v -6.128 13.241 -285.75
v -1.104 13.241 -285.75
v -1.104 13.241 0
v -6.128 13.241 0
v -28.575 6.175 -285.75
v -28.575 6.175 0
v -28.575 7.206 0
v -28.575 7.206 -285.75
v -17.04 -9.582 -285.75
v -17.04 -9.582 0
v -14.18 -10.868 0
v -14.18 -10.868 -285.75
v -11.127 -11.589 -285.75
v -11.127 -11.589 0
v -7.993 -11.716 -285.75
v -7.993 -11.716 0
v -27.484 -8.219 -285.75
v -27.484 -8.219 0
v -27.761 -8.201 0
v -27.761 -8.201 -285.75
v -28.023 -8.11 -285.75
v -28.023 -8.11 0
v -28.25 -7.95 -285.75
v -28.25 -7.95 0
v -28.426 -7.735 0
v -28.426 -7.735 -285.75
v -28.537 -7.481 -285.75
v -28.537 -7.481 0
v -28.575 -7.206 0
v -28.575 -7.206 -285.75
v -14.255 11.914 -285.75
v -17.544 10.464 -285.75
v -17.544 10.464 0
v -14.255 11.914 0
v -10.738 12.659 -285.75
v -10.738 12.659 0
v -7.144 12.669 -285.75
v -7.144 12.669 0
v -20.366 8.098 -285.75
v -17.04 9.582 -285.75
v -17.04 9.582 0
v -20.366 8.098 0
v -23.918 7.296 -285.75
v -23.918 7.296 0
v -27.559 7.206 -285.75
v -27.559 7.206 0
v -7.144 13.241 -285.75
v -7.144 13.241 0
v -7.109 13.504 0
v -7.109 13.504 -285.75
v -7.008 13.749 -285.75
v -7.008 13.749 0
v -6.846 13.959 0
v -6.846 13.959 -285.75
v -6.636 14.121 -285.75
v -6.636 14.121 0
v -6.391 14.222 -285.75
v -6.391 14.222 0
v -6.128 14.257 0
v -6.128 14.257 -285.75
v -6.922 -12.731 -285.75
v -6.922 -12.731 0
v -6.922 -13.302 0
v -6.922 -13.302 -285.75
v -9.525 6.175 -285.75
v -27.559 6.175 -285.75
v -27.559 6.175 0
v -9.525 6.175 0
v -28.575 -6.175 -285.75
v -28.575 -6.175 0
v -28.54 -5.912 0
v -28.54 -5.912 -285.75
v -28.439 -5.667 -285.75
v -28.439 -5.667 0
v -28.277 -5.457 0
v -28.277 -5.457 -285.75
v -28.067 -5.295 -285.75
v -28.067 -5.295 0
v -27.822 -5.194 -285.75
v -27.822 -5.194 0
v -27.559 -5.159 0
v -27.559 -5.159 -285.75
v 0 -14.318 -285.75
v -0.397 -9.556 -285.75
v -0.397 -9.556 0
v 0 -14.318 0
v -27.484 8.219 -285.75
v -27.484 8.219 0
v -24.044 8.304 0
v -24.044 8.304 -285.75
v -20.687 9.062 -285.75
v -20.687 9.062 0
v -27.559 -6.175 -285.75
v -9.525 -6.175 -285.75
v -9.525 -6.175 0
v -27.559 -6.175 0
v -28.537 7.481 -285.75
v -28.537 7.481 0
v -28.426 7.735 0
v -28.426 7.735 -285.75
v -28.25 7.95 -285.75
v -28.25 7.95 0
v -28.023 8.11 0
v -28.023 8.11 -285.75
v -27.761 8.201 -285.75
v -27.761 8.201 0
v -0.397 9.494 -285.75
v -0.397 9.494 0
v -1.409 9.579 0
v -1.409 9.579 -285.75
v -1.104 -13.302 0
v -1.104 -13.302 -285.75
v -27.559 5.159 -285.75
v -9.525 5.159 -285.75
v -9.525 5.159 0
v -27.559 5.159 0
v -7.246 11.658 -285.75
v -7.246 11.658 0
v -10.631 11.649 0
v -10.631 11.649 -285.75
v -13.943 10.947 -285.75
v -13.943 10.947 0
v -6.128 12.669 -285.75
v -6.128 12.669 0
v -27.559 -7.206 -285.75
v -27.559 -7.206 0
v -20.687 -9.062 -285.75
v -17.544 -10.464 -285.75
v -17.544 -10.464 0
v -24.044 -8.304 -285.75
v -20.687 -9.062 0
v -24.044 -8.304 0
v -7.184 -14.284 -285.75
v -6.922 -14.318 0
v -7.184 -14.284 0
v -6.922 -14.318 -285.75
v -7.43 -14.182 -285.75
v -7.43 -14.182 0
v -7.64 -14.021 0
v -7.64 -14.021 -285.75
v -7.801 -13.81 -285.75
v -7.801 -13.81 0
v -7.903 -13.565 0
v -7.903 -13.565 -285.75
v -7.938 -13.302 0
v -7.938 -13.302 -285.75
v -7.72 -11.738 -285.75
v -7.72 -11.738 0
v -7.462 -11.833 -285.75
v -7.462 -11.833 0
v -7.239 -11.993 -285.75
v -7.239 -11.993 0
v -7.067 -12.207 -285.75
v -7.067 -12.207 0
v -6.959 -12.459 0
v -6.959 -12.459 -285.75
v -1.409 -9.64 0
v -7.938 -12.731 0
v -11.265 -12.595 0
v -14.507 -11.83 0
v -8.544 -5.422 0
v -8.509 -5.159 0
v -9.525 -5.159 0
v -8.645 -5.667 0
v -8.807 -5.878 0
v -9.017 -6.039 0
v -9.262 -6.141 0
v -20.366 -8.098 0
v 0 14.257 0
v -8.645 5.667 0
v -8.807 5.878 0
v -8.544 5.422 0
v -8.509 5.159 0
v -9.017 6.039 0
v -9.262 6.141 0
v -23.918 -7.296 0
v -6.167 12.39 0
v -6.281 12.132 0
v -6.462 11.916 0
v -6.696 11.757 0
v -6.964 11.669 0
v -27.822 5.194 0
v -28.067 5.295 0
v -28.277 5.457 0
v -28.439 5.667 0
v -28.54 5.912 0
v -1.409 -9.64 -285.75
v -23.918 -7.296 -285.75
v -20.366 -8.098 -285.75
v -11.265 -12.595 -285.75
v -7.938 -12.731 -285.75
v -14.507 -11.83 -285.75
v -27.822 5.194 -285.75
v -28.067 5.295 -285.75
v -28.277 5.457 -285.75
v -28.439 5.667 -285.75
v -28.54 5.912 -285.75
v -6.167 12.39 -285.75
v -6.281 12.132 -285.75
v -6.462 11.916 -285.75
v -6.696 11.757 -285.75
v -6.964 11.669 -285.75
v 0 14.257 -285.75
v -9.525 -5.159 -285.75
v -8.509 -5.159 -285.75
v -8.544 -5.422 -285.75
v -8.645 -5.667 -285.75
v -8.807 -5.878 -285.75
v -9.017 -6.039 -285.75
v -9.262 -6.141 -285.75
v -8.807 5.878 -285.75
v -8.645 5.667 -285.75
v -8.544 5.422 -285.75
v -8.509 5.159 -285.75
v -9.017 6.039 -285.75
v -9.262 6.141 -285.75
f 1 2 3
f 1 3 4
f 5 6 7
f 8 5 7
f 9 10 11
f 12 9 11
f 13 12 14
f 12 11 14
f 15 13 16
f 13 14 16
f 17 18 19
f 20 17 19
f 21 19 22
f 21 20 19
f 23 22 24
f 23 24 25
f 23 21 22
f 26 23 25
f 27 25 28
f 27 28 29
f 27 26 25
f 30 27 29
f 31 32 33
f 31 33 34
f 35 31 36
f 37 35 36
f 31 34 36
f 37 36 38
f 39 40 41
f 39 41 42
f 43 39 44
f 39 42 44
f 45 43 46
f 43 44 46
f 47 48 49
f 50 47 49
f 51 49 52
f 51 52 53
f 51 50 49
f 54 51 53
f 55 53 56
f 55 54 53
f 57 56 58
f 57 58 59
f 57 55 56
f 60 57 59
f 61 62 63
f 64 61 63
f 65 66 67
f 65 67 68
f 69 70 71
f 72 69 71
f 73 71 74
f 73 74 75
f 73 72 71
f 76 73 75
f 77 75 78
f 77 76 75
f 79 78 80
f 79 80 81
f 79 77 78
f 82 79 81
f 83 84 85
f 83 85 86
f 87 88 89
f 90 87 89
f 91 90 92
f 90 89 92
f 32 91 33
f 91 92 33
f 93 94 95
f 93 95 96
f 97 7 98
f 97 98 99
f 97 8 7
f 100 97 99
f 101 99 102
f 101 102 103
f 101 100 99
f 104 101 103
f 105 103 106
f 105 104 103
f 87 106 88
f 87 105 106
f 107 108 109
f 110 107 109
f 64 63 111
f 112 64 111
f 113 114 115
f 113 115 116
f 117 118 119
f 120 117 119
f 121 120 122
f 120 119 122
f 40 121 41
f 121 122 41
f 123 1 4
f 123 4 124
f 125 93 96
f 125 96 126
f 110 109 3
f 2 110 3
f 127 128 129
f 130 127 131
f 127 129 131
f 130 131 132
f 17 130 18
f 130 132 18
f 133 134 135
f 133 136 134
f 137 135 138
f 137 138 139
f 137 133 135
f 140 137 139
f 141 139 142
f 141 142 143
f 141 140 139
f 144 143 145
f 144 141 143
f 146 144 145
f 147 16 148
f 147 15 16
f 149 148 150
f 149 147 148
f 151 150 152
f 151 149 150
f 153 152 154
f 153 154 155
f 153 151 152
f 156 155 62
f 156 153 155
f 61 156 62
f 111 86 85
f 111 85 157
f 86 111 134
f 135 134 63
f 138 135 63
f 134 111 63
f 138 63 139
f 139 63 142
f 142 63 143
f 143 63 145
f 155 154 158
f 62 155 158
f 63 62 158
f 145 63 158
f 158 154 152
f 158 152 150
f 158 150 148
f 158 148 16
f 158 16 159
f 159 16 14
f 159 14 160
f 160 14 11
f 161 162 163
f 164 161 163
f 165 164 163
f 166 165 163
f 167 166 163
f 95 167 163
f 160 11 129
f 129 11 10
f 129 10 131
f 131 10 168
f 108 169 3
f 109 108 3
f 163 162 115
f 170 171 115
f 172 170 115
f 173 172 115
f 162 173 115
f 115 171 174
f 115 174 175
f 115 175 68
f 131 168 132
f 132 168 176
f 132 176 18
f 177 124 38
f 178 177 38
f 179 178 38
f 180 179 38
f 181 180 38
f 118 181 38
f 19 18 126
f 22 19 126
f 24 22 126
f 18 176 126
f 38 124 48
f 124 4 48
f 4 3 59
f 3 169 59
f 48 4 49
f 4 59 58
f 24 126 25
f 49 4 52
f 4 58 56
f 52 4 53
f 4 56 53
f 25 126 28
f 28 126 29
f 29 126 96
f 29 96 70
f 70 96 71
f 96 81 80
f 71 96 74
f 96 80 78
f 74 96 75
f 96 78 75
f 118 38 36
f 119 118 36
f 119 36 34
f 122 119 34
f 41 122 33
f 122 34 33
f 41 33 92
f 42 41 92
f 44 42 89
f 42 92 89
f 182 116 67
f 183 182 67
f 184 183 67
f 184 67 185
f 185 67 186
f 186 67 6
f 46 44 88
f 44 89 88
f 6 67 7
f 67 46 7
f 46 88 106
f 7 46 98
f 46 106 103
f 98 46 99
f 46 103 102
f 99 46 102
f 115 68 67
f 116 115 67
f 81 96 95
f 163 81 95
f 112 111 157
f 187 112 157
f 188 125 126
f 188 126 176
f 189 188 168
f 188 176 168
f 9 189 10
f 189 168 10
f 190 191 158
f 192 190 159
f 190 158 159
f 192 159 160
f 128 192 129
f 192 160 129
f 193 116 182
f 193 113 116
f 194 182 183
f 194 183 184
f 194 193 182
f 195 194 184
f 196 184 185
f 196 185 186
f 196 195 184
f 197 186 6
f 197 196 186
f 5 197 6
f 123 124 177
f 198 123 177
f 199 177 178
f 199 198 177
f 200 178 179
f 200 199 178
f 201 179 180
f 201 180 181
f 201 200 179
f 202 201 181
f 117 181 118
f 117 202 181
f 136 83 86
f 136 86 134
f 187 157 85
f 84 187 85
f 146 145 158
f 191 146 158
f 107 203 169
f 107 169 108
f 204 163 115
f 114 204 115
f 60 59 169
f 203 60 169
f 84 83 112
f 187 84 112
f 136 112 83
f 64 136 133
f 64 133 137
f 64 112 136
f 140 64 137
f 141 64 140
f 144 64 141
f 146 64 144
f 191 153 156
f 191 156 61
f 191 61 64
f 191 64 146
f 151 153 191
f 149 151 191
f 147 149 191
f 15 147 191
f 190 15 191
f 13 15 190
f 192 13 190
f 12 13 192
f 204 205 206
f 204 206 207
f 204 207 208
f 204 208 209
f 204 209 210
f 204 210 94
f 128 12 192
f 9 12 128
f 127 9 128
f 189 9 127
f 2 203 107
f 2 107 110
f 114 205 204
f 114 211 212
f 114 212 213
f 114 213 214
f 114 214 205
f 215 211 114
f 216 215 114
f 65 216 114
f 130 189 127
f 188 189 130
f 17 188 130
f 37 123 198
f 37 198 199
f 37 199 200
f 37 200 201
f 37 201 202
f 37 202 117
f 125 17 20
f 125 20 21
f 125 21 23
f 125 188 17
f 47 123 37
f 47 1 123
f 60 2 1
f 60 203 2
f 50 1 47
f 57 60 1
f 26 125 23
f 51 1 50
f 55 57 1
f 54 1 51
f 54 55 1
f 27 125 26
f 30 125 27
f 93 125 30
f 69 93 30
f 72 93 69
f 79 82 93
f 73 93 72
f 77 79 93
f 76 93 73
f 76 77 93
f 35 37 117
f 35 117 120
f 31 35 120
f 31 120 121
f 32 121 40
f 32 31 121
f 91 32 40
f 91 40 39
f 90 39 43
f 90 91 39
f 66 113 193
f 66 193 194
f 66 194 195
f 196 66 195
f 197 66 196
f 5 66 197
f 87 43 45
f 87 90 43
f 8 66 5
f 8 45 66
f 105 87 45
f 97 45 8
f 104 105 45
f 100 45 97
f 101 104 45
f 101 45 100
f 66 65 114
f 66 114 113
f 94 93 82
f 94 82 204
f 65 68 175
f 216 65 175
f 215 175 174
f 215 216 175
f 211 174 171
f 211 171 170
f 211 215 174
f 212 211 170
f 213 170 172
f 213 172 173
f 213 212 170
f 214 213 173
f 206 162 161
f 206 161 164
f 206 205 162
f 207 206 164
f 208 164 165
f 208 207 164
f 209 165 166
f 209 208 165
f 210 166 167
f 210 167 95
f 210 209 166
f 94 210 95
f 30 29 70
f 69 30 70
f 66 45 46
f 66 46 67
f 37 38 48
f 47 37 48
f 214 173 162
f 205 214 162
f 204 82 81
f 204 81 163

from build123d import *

# Parameters (mm, degrees)
EXTRUDE_THIN1_DEPTH = 285.75
FILLET1_R           = 1.016


with BuildPart() as part:
    # Sketch1 → Extrude-Thin1 (new body)
    with BuildSketch(Plane.XY):
        with BuildLine():
            Line((-0.396875, -9.555854473), (0, -14.318354473))
            Line((0, -14.318354473), (-7.9375, -14.318354473))
            Line((-7.9375, -14.318354473), (-7.9375, -12.730854473))
            ThreePointArc((-7.9375, -12.730854473), (-12.904112533, -12.290327979), (-17.543767938, -10.46415675))
            ThreePointArc((-17.543767938, -10.46415675), (-22.883426301, -8.487890863), (-28.575, -8.334375))
            Line((-28.575, -8.334375), (-28.575, -5.159375))
            Line((-28.575, -5.159375), (-9.525, -5.159375))
            Line((-9.525, -5.159375), (-9.525, 5.159375))
            Line((-9.525, 5.159375), (-28.575, 5.159375))
            Line((-28.575, 5.159375), (-28.575, 8.334375))
            ThreePointArc((-28.575, 8.334375), (-22.883426301, 8.487890863), (-17.543767938, 10.46415675))
            ThreePointArc((-17.543767938, 10.46415675), (-12.515637367, 12.377330284), (-7.14375, 12.669145527))
            Line((-7.14375, 12.669145527), (-7.14375, 14.256645527))
            Line((-7.14375, 14.256645527), (0, 14.256645527))
            Line((0, 14.256645527), (-0.396875, 9.494145527))
            Line((-0.396875, 9.494145527), (-1.40936549, 9.578519735))
            Line((-1.40936549, 9.578519735), (-1.104188341, 13.240645527))
            Line((-1.104188341, 13.240645527), (-6.12775, 13.240645527))
            Line((-6.12775, 13.240645527), (-6.12775, 11.50678851))
            ThreePointArc((-6.12775, 11.50678851), (-11.751151598, 11.490941353), (-17.040496255, 9.581561932))
            ThreePointArc((-17.040496255, 9.581561932), (-22.1225879, 7.60931063), (-27.559, 7.205758691))
            Line((-27.559, 7.205758691), (-27.559, 6.175375))
            Line((-27.559, 6.175375), (-8.509, 6.175375))
            Line((-8.509, 6.175375), (-8.509, -6.175375))
            Line((-8.509, -6.175375), (-27.559, -6.175375))
            Line((-27.559, -6.175375), (-27.559, -7.205758691))
            ThreePointArc((-27.559, -7.205758691), (-22.1225879, -7.60931063), (-17.040496255, -9.581561932))
            ThreePointArc((-17.040496255, -9.581561932), (-12.145263139, -11.416445859), (-6.9215, -11.622370501))
            Line((-6.9215, -11.622370501), (-6.9215, -13.302354473))
            Line((-6.9215, -13.302354473), (-1.104188341, -13.302354473))
            Line((-1.104188341, -13.302354473), (-1.40936549, -9.64022868))
            Line((-1.40936549, -9.64022868), (-0.396875, -9.555854473))
        make_face()
    extrude(amount=-EXTRUDE_THIN1_DEPTH)

    # Fillet1
    fillet1_edges = [part.edges().sort_by_distance(p)[0] for p in [
        (-7.9375, -14.318354473, -142.875),
        (-28.575, -8.334375, -142.875),
        (-28.575, -5.159375, -142.875),
        (-28.575, 5.159375, -142.875),
        (-28.575, 8.334375, -142.875),
        (-7.14375, 14.256645527, -142.875),
        (-6.12775, 11.50678851, -142.875),
        (-8.509, 6.175375, -142.875),
        (-8.509, -6.175375, -142.875),
        (-6.9215, -11.622370501, -142.875),
    ]]
    fillet(fillet1_edges, radius=FILLET1_R)


solid = part.part
